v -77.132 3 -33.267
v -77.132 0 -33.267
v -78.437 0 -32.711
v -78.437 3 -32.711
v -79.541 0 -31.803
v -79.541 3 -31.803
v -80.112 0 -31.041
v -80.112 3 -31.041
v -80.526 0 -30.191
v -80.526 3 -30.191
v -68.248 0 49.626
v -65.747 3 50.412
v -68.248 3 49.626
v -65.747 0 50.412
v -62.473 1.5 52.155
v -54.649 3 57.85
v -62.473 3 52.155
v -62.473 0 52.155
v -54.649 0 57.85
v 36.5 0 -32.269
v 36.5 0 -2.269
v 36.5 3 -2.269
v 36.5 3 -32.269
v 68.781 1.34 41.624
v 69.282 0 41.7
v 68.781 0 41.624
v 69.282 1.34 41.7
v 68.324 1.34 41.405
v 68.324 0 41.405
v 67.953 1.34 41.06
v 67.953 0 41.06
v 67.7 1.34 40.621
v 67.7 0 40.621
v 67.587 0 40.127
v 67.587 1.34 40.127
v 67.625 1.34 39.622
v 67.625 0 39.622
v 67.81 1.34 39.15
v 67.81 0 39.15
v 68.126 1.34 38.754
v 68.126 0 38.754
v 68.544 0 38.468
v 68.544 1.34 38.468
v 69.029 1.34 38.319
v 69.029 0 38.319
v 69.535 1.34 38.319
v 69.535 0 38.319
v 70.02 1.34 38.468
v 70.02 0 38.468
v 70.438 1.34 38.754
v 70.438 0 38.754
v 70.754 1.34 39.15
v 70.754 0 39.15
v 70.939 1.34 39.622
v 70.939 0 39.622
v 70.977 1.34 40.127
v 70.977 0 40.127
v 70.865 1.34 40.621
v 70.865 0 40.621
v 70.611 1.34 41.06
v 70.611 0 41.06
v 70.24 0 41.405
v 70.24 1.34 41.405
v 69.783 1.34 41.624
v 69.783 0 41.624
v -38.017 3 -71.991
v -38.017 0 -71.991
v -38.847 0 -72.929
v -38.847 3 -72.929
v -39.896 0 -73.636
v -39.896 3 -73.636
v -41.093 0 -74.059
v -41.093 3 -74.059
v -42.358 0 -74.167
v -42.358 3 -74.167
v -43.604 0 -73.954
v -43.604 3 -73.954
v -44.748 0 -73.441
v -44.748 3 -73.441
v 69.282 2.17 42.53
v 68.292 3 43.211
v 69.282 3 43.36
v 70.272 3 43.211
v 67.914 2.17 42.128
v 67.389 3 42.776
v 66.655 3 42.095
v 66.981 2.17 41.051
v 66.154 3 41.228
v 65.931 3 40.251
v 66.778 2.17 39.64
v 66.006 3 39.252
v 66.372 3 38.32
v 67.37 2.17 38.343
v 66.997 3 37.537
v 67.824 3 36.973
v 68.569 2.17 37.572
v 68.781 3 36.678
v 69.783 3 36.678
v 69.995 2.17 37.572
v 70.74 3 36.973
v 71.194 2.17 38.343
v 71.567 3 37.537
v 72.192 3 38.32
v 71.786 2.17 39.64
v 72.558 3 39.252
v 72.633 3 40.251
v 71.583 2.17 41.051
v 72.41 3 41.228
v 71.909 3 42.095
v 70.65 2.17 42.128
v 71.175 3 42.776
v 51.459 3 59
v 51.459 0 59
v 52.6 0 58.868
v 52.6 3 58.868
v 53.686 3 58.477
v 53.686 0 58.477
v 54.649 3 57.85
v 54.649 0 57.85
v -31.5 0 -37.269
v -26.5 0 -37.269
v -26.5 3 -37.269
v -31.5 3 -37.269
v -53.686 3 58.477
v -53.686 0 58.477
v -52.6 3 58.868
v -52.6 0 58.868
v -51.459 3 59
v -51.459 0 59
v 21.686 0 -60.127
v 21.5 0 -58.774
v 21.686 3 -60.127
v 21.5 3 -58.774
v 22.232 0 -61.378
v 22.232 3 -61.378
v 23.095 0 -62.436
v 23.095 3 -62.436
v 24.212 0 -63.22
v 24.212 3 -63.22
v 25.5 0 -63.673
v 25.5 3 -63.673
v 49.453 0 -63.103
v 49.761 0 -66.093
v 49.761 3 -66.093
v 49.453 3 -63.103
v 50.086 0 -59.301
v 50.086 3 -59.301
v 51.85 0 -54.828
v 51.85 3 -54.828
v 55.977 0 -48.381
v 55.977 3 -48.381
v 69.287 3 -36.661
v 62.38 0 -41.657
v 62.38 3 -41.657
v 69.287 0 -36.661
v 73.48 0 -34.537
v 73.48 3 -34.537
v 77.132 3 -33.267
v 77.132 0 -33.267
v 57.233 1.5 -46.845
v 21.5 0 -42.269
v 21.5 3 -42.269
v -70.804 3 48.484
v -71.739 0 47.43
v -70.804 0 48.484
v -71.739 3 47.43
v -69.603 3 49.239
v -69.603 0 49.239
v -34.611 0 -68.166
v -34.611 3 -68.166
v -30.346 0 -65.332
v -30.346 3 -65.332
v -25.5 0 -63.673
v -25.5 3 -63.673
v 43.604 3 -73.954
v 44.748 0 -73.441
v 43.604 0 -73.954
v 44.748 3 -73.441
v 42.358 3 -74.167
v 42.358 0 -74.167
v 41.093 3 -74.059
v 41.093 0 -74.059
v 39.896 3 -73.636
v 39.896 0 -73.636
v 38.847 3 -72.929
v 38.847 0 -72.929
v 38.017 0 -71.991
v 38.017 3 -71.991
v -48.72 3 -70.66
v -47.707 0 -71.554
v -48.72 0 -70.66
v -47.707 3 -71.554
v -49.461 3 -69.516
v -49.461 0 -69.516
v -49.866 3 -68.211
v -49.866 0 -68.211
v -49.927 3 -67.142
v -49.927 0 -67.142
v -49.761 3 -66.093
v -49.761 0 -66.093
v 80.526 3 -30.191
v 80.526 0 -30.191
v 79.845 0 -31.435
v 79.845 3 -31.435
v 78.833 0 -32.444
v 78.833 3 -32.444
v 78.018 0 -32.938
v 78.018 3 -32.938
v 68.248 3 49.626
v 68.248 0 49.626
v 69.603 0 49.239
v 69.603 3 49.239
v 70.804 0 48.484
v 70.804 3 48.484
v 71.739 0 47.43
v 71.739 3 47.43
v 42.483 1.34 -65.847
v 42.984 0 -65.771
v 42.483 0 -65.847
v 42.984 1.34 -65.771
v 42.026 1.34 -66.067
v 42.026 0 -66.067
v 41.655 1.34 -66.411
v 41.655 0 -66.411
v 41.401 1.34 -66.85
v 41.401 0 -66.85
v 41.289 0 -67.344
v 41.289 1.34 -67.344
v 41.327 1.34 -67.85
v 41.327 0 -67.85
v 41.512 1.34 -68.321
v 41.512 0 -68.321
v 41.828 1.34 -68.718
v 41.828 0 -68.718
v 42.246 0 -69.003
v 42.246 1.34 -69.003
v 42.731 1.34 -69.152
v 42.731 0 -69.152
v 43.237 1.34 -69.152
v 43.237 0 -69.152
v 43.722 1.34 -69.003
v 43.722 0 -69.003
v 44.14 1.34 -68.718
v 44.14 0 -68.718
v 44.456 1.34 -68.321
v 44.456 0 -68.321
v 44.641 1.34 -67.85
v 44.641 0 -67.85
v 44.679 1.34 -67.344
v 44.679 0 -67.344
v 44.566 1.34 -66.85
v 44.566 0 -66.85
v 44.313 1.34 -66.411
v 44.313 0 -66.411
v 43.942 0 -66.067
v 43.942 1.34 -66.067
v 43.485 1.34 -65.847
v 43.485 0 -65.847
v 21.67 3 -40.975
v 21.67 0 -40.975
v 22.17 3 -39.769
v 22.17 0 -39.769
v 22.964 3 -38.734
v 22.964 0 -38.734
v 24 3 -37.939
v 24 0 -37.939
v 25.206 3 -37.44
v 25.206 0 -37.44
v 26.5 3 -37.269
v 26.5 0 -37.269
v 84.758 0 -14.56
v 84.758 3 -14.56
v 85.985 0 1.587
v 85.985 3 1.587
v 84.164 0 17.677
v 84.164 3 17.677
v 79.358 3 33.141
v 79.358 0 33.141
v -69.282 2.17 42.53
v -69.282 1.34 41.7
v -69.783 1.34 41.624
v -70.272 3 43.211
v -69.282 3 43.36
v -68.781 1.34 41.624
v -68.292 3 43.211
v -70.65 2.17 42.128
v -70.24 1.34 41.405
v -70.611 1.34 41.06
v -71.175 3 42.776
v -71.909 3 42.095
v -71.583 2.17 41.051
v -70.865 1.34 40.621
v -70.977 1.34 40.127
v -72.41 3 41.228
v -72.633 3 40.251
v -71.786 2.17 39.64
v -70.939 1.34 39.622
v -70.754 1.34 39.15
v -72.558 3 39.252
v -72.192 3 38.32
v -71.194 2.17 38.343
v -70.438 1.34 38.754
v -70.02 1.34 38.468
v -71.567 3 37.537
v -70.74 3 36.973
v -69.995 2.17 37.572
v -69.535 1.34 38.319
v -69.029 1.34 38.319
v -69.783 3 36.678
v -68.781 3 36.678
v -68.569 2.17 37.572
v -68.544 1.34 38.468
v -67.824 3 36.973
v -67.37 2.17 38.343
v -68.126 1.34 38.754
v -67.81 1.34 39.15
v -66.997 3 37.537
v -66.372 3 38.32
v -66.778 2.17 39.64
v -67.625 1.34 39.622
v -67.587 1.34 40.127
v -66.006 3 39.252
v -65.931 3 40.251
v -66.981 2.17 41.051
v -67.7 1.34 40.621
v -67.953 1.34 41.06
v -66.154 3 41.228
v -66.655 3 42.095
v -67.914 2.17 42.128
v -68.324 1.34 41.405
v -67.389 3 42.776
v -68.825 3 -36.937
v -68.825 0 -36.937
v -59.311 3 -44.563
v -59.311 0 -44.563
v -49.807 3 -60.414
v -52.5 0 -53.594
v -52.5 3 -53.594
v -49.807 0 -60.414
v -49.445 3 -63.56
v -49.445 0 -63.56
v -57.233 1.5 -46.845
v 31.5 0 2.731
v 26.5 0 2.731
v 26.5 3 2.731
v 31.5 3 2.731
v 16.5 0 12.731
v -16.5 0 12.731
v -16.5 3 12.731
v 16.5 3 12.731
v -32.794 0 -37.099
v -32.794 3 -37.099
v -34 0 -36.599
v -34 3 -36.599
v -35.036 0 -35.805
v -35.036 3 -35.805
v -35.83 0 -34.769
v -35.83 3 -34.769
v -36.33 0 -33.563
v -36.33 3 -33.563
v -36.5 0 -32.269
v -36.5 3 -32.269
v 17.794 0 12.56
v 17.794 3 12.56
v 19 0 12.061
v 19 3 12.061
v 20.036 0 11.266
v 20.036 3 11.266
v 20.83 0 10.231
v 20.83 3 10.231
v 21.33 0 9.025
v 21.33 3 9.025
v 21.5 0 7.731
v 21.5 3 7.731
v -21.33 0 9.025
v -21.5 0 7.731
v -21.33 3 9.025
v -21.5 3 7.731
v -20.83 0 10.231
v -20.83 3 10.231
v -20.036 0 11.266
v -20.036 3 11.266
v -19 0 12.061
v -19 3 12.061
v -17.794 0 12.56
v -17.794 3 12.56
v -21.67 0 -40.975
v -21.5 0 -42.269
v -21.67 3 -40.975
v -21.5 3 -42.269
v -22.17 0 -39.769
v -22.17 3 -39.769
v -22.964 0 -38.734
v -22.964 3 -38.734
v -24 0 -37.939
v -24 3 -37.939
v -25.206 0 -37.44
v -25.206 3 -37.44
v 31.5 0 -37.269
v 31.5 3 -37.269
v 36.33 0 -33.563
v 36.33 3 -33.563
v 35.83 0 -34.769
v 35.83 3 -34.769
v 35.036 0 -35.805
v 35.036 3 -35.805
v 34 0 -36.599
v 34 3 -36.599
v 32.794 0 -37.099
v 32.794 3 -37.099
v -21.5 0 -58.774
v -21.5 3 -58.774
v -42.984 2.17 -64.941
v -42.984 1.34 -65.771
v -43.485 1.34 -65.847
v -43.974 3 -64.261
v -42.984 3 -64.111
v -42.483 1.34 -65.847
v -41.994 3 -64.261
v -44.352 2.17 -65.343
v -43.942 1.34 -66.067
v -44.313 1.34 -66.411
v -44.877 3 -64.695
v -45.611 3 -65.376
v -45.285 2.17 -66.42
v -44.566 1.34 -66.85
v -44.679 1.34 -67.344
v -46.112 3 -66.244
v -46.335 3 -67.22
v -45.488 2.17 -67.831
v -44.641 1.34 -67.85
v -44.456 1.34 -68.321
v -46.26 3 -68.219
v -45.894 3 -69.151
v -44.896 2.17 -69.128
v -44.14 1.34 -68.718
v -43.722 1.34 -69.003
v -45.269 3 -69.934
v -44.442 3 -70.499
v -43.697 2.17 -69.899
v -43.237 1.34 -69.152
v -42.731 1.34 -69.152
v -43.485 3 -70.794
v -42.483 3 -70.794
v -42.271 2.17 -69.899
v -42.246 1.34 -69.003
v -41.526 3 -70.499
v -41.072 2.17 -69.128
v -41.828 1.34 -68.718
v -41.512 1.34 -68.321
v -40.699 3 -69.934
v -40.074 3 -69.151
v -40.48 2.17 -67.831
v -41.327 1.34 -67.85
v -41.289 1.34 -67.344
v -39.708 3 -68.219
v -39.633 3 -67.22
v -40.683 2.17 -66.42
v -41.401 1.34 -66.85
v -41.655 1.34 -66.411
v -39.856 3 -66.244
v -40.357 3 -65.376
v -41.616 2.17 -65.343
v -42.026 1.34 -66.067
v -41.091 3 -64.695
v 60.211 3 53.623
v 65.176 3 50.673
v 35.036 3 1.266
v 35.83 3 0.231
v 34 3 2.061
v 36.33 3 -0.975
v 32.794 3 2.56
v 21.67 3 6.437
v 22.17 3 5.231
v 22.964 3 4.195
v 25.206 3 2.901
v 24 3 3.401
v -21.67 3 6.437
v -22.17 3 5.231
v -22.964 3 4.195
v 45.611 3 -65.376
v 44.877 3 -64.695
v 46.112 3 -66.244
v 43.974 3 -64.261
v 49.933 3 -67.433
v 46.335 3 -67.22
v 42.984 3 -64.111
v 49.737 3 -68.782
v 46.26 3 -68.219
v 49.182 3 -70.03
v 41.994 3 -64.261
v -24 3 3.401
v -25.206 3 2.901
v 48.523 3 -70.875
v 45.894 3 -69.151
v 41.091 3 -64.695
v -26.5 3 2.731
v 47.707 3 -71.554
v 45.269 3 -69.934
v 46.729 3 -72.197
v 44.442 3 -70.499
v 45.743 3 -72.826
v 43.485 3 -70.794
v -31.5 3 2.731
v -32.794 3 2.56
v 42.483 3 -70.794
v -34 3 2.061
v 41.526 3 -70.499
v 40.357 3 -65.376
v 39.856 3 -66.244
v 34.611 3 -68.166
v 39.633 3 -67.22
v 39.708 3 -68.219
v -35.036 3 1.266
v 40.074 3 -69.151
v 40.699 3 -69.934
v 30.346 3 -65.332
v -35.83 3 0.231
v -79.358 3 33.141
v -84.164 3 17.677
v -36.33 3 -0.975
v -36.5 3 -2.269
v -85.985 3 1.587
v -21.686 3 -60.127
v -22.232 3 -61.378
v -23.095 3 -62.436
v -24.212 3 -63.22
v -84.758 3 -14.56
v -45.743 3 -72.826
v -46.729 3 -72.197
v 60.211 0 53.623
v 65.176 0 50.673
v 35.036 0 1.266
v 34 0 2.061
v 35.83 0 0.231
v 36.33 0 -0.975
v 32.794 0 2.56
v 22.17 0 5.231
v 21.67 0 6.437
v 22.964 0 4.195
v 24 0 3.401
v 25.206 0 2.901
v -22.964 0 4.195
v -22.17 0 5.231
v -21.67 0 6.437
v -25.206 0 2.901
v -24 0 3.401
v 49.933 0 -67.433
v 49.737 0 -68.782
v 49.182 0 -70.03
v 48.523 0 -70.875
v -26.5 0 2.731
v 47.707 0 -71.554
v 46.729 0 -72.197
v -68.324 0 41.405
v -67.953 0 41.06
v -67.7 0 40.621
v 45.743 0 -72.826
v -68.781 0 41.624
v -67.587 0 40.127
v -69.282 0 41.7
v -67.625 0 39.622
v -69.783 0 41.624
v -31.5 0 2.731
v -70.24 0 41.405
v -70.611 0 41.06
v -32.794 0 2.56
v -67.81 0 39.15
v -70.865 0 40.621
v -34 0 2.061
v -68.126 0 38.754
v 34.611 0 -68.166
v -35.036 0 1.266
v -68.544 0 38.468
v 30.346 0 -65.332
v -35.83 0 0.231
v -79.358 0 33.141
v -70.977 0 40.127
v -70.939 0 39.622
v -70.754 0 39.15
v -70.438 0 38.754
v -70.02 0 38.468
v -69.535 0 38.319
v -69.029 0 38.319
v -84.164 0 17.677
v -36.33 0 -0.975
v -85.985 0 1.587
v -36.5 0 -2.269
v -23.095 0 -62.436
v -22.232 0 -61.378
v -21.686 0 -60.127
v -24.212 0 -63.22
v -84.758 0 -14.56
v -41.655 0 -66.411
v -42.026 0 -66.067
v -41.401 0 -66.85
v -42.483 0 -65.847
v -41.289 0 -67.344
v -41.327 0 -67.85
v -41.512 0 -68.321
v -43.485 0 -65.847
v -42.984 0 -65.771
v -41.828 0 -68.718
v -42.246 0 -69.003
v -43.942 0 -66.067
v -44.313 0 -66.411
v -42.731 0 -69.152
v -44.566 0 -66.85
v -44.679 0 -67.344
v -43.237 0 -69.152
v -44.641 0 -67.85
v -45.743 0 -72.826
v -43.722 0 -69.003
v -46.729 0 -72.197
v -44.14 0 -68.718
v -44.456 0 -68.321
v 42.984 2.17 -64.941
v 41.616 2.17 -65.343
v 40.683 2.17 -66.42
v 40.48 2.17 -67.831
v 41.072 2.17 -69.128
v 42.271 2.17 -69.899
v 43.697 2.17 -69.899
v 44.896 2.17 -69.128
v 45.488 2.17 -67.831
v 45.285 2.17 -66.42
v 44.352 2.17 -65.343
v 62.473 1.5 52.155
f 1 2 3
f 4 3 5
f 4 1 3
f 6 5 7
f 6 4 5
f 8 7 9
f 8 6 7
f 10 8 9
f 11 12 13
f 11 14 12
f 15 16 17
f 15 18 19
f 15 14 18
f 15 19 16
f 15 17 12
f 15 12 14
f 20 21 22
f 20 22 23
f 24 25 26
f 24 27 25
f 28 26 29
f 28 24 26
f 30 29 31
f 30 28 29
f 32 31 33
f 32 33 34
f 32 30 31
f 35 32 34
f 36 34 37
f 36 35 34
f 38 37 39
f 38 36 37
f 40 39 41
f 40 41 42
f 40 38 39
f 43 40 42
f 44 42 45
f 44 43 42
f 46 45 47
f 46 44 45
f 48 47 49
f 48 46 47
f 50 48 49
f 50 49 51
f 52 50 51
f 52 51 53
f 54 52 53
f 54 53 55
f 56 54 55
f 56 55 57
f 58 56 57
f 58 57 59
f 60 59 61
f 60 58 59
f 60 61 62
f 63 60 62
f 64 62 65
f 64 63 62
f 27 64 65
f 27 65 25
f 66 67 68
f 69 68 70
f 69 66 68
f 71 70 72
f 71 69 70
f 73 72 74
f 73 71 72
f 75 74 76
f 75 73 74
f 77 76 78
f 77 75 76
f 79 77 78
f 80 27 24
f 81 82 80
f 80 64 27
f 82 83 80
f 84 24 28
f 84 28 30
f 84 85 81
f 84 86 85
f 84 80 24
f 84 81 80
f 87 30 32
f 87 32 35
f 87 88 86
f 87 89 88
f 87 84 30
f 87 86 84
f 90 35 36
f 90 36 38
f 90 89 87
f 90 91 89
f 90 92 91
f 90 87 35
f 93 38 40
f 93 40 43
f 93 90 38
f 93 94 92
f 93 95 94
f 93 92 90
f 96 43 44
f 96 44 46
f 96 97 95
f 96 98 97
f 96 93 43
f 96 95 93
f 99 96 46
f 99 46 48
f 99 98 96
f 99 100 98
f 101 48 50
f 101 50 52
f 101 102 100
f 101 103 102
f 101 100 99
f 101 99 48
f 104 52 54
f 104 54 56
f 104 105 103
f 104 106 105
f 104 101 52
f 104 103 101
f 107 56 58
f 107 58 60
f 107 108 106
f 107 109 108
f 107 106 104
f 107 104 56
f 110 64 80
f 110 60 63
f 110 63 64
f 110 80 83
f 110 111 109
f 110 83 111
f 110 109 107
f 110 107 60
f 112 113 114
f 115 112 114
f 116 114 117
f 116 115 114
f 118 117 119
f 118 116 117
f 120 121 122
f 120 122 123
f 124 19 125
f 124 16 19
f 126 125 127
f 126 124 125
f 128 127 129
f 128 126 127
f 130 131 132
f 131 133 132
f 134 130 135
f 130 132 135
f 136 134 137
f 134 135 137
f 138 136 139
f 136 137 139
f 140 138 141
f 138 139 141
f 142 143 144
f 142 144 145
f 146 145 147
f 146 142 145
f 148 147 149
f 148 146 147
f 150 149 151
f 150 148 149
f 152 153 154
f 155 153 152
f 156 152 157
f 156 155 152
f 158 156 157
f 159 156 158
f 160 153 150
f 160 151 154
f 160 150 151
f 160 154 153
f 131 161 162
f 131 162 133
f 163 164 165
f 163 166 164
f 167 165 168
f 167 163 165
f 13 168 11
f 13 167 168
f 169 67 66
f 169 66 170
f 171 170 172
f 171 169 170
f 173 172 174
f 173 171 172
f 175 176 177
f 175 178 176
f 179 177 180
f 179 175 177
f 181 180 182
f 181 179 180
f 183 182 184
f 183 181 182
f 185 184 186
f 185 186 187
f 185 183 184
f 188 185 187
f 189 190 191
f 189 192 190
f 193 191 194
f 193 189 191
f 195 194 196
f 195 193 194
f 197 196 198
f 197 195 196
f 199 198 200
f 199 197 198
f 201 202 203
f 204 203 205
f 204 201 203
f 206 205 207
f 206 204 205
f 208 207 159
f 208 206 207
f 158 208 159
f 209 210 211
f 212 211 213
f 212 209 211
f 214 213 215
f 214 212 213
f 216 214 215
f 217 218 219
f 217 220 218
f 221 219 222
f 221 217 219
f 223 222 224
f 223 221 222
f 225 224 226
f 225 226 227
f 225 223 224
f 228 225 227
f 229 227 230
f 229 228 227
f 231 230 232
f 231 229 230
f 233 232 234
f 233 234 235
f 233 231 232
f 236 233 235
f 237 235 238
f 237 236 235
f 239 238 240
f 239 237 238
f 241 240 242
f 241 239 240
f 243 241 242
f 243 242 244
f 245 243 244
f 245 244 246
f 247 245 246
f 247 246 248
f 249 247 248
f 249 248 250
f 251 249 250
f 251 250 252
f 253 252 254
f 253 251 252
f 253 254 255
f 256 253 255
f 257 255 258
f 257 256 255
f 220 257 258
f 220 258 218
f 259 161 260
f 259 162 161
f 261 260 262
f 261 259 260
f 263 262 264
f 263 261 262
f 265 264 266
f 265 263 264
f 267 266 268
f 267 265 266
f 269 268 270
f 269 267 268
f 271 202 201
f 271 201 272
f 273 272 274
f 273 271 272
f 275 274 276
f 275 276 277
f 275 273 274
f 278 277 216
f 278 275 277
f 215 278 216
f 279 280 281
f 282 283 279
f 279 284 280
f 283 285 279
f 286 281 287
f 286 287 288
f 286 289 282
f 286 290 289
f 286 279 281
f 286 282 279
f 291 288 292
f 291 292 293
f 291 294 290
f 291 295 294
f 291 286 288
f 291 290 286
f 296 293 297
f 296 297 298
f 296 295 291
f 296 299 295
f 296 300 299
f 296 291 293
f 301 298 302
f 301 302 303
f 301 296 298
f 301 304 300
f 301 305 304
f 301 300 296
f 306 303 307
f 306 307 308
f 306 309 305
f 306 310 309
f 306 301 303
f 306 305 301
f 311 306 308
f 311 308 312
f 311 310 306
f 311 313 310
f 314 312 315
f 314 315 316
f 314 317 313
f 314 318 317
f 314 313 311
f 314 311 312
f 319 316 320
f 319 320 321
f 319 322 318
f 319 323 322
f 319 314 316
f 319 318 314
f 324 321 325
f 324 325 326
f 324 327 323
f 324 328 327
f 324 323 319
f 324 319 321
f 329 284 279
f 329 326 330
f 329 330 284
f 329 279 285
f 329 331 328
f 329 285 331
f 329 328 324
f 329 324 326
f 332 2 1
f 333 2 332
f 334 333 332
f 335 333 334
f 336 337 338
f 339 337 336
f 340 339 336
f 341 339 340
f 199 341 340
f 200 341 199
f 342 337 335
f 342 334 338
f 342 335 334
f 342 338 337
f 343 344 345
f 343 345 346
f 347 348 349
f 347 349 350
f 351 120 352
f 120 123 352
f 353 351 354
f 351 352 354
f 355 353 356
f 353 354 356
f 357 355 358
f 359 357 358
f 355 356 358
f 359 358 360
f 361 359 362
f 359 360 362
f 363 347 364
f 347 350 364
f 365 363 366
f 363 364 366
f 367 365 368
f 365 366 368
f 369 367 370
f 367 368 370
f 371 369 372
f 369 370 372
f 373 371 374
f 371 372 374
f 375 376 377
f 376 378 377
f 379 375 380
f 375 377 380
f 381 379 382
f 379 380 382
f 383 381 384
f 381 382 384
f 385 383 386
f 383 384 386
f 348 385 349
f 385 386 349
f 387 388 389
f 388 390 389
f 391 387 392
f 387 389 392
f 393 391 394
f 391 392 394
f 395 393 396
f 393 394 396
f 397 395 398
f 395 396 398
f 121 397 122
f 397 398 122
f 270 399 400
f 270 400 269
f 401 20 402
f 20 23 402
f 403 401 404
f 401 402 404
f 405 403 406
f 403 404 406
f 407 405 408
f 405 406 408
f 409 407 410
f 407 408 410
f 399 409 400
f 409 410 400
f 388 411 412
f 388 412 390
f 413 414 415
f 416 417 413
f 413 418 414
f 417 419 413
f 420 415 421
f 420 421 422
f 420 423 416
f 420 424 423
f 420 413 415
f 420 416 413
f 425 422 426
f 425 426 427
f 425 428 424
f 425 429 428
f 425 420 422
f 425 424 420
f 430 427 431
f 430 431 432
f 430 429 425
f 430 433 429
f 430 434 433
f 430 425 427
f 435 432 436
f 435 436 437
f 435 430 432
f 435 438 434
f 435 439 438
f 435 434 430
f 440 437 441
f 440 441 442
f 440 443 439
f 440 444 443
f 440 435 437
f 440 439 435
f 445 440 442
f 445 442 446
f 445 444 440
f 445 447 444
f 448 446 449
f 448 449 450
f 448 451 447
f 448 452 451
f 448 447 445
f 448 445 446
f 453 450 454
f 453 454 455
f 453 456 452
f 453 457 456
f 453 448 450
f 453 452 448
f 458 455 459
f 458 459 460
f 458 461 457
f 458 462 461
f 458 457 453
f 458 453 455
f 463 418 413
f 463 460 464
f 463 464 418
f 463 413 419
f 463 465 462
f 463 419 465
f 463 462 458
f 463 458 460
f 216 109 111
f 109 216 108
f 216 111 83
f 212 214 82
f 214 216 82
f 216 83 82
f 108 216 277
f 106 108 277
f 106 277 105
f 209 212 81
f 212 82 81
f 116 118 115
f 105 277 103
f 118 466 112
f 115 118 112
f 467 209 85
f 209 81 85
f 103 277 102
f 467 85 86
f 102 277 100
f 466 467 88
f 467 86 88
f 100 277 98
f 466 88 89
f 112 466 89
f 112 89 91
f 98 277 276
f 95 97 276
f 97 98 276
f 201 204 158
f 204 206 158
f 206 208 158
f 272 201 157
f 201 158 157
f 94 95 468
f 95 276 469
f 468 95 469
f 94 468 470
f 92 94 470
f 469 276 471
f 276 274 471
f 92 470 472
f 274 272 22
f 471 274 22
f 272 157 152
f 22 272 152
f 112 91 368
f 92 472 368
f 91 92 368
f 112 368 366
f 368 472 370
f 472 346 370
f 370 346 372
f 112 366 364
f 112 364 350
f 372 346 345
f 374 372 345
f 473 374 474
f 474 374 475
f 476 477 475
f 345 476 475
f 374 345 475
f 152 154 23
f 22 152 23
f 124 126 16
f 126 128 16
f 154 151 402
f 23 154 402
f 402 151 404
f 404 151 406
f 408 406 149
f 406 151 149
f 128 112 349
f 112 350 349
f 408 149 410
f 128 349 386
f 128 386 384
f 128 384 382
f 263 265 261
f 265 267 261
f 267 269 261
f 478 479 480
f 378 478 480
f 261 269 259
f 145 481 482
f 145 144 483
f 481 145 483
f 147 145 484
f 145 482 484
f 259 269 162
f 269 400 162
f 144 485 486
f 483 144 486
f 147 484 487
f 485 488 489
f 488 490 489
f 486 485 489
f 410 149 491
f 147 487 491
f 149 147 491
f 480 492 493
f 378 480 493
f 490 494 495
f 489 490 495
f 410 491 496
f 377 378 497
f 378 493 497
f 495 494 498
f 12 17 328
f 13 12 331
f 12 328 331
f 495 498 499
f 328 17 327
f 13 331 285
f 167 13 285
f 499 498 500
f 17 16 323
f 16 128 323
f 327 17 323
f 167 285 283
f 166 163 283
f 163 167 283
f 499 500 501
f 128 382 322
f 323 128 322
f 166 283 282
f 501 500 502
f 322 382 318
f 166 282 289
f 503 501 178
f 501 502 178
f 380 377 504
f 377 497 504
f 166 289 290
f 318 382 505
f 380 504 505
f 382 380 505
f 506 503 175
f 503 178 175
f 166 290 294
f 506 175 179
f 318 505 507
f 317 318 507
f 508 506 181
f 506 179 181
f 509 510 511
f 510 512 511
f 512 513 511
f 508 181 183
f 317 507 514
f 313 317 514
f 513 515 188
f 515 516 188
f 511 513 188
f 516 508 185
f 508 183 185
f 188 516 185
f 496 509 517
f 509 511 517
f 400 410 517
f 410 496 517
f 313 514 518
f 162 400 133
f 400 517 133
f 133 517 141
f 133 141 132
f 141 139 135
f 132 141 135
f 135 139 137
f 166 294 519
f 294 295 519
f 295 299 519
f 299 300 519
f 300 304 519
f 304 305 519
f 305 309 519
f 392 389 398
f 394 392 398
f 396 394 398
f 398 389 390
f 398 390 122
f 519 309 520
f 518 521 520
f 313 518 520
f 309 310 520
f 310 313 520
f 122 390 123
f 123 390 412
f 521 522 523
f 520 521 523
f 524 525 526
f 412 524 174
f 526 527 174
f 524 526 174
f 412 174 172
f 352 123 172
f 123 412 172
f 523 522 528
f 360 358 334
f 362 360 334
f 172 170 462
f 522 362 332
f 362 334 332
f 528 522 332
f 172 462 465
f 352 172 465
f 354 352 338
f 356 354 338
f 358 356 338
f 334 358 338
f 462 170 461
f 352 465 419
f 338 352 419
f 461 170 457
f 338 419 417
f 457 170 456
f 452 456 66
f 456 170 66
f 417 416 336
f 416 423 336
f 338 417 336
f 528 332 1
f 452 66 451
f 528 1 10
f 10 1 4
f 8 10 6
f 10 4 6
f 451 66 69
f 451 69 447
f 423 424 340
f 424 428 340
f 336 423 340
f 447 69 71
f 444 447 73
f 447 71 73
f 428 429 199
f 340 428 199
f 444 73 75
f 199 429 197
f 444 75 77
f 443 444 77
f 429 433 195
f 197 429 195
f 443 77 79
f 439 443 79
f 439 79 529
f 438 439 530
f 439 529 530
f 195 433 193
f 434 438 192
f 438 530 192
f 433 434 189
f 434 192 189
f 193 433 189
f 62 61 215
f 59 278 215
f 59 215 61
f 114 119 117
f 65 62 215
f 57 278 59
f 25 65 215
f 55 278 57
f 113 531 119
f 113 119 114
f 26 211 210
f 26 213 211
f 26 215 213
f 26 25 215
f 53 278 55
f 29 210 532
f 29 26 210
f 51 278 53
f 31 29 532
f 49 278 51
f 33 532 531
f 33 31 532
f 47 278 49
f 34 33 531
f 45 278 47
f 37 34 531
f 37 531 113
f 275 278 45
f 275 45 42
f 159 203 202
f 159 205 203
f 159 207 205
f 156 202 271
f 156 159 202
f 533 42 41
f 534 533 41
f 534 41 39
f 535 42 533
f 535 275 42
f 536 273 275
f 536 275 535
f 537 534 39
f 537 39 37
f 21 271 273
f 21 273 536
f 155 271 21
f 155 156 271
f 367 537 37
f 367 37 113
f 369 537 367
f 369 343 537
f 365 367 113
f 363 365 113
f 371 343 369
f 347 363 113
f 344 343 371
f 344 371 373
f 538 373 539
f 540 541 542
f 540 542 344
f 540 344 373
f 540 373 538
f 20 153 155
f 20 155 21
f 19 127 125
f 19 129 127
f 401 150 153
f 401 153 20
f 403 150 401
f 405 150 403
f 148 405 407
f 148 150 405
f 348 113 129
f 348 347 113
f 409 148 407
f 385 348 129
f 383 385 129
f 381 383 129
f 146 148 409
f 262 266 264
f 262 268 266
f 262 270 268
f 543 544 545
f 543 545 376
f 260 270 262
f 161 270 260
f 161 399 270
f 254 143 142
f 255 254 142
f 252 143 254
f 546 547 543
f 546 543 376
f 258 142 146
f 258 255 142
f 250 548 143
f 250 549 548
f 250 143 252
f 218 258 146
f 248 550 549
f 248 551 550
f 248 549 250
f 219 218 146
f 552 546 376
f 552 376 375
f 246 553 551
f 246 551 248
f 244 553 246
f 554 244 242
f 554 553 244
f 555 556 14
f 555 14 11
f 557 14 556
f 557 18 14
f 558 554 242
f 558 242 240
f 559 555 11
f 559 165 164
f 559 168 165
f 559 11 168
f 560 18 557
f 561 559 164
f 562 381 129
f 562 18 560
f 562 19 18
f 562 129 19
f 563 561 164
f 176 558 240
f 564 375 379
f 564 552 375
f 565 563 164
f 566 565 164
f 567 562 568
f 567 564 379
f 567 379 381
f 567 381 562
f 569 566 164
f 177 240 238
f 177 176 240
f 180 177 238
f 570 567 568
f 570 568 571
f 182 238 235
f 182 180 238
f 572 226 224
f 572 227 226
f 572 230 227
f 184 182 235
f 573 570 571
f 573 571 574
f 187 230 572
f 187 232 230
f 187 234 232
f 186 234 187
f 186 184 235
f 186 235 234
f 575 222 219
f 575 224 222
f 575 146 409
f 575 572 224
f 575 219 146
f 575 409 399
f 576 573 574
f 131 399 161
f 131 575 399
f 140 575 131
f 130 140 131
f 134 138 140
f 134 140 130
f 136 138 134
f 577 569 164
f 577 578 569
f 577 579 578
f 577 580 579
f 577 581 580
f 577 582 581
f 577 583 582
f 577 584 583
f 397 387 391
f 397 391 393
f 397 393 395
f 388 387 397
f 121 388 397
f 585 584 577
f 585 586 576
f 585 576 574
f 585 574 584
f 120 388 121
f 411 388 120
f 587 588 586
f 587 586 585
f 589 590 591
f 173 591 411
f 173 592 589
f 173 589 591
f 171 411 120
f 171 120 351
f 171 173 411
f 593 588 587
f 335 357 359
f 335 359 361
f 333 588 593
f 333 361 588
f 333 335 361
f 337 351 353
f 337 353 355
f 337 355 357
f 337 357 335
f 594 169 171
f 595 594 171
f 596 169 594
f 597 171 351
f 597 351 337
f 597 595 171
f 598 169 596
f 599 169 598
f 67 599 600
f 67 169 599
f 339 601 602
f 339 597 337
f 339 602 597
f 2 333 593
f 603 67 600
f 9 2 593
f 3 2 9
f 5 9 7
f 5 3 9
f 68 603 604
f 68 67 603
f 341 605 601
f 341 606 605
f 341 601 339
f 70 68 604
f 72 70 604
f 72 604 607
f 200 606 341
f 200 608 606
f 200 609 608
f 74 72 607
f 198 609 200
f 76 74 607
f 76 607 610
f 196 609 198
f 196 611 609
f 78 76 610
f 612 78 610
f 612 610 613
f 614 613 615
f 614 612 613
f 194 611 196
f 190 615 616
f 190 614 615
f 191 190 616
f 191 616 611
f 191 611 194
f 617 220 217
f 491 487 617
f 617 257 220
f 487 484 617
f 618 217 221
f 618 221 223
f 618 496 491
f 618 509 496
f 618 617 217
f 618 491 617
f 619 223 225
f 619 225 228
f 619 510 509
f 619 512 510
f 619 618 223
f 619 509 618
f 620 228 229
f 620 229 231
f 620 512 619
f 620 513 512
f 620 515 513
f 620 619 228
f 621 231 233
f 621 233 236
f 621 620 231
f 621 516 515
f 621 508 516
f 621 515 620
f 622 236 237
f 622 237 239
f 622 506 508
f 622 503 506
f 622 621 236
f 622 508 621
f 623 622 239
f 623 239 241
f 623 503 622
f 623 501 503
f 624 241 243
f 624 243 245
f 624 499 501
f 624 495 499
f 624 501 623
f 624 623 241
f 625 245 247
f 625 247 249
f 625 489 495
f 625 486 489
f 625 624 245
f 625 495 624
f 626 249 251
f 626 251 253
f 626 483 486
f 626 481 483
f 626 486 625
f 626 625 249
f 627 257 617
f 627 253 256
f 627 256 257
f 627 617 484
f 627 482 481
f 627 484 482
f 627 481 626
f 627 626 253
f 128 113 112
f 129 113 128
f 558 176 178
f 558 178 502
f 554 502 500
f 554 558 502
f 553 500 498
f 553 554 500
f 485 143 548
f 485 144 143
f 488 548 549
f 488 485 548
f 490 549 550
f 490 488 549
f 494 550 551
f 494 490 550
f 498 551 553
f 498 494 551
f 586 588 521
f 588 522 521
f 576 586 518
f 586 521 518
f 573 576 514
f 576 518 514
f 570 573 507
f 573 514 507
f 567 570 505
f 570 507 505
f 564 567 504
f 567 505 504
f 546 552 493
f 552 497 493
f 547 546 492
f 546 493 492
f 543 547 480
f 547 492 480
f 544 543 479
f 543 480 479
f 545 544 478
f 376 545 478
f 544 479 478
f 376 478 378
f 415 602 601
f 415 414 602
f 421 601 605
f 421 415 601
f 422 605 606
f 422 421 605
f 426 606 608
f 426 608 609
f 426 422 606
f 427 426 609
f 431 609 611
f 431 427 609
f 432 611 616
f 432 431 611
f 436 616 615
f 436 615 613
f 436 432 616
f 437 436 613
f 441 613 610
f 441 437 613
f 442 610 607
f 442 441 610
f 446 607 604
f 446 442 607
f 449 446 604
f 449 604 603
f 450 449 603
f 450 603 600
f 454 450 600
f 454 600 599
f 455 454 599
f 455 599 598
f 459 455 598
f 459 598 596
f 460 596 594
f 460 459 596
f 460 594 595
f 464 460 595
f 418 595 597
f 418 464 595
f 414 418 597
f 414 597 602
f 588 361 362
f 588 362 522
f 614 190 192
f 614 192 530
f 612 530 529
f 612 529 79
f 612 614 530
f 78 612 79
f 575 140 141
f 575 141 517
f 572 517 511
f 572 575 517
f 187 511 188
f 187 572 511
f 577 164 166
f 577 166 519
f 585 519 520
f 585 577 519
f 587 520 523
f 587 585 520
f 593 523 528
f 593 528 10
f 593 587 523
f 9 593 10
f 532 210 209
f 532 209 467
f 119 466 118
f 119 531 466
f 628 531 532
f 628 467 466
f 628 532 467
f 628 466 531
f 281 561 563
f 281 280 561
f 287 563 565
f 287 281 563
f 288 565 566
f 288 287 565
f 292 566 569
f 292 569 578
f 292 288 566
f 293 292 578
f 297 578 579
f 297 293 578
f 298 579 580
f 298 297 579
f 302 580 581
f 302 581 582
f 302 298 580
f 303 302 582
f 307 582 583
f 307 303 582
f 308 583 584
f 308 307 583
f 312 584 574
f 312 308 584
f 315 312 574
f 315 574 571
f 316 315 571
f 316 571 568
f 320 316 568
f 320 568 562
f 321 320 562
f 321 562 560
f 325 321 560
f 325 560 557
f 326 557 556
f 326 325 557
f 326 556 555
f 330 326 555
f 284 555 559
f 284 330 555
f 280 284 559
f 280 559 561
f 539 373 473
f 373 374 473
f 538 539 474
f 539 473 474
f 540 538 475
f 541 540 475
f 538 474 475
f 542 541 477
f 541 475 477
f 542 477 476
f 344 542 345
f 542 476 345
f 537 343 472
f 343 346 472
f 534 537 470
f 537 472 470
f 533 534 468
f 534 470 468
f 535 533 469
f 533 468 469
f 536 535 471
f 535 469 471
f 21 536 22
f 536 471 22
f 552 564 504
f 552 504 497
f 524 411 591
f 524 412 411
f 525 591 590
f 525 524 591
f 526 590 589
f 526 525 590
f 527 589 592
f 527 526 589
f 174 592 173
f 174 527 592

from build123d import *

# Parameters (mm, degrees)
RESSALTO_EXTRUS_O2_DEPTH            = 3
ESCAREADO_PARA_SFHCS_M31_AT_2_COUNT = 2
ESCAREADO_PARA_SFHCS_M31_AT_2_PITCH = 110.642088925
ESCAREADO_PARA_SFHCS_M31_AT_3_COUNT = 2
ESCAREADO_PARA_SFHCS_M31_AT_3_PITCH = 155.41473117
ESCAREADO_PARA_SFHCS_M31_AT_4_COUNT = 2
ESCAREADO_PARA_SFHCS_M31_AT_4_PITCH = 85.967937335
FILETE4_R                           = 5
FILETE6_R                           = 5
FILETE7_R                           = 5
FILETE8_R                           = 5


with BuildPart() as part:
    # Esboço3 → Ressalto-extrusão2 (new body)
    with BuildSketch(Plane(origin=(0, 0, 0), x_dir=(1, 0, 0), z_dir=(0, 1, 0))):
        with BuildLine():
            Line((-21.5, 63.269141943), (-21.5, 37.269141943))
            Line((-21.5, 37.269141943), (-36.5, 37.269141943))
            Line((-36.5, 37.269141943), (-36.5, -2.730858057))
            Line((-36.5, -2.730858057), (-21.5, -2.730858057))
            Line((-21.5, -2.730858057), (-21.5, -12.730858057))
            Line((-21.5, -12.730858057), (21.5, -12.730858057))
            Line((21.5, -12.730858057), (21.5, -2.730858057))
            Line((21.5, -2.730858057), (36.5, -2.730858057))
            Line((36.5, -2.730858057), (36.5, 37.269141943))
            Line((36.5, 37.269141943), (21.5, 37.269141943))
            Line((21.5, 37.269141943), (21.5, 63.269141943))
            ThreePointArc((21.5, 63.269141943), (32.805831499, 66.771318629), (40.152161049, 76.051324532))
            ThreePointArc((40.152161049, 76.051324532), (45.878189612, 72.740578208), (51.332841832, 68.999560502))
            add(Edge.make_bspline(
                [(51.332841832, 68.999560502), (24.845967814, 40.579122115), (79.509348747, 32.775958595)],
                knots=[0, 0, 0, 2.519003886, 2.519003886, 2.519003886], degree=2, weights=[1, 0.306291066, 1]))
            ThreePointArc((79.509348747, 32.775958595), (85.434712449, -9.844283047), (69.971422738, -50))
            add(Edge.make_bspline(
                [(69.971422738, -50), (67.189039214, -47.047402145), (53.286638173, -59)],
                knots=[3.141592654, 3.141592654, 3.141592654, 4.504907102, 4.504907102, 4.504907102], degree=2, weights=[1, 0.776529601, 1]))
            Line((53.286638173, -59), (-53.286638173, -59))
            add(Edge.make_bspline(
                [(-53.286638173, -59), (-67.189039214, -47.047402145), (-69.971422738, -50)],
                knots=[1.778278205, 1.778278205, 1.778278205, 3.141592654, 3.141592654, 3.141592654], degree=2, weights=[1, 0.776529601, 1]))
            ThreePointArc((-69.971422738, -50), (-85.434712449, -9.844283047), (-79.509348747, 32.775958595))
            add(Edge.make_bspline(
                [(-79.509348747, 32.775958595), (-24.845967814, 40.579122115), (-51.332841832, 68.999560502)],
                knots=[0.622588768, 0.622588768, 0.622588768, 3.141592654, 3.141592654, 3.141592654], degree=2, weights=[1, 0.306291066, 1]))
            ThreePointArc((-51.332841832, 68.999560502), (-45.878189612, 72.740578208), (-40.152161049, 76.051324532))
            ThreePointArc((-40.152161049, 76.051324532), (-32.805831499, 66.771318629), (-21.5, 63.269141943))
        make_face()
    extrude(amount=RESSALTO_EXTRUS_O2_DEPTH)

    # Esboço12 → Escareado para SFHCS M31 (revolve, cut)
    with BuildSketch(Plane(origin=(42.983968668, 3, -67.471315665), x_dir=(0, 0, 1), z_dir=(1, 0, 0))):
        Polygon((0, 0), (0, 3), (1.7, 3), (1.7, 1.66), (3.36, 0), align=None)
    escareado_para_sfhcs_m31 = revolve(axis=Axis((42.983968668, 9.35, -67.471315665), (0, -1, 0)), mode=Mode.SUBTRACT)

    # Escareado para SFHCS M31 at 2: Escareado para SFHCS M31 ×2
    with Locations(*[Vector(0.23768589232617374, 0, 0.9713420698132613) * (i * ESCAREADO_PARA_SFHCS_M31_AT_2_PITCH) for i in range(1, ESCAREADO_PARA_SFHCS_M31_AT_2_COUNT)]):
        add(escareado_para_sfhcs_m31, mode=Mode.SUBTRACT)

    # Escareado para SFHCS M31 at 3: Escareado para SFHCS M31 ×2
    with Locations(*[Vector(-0.7223639620597521, 0, 0.6915130557822732) * (i * ESCAREADO_PARA_SFHCS_M31_AT_3_PITCH) for i in range(1, ESCAREADO_PARA_SFHCS_M31_AT_3_COUNT)]):
        add(escareado_para_sfhcs_m31, mode=Mode.SUBTRACT)

    # Escareado para SFHCS M31 at 4: Escareado para SFHCS M31 ×2
    with Locations(*[(-i * ESCAREADO_PARA_SFHCS_M31_AT_4_PITCH, 0, 0) for i in range(1, ESCAREADO_PARA_SFHCS_M31_AT_4_COUNT)]):
        add(escareado_para_sfhcs_m31, mode=Mode.SUBTRACT)

    # Filete4
    filete4_edges = [part.edges().sort_by_distance(p)[0] for p in [
        (21.5, 1.5, -63.269141943),
        (40.152161049, 1.5, -76.051324532),
        (-40.152161049, 1.5, -76.051324532),
        (-21.5, 1.5, -63.269141943),
    ]]
    fillet(filete4_edges, radius=FILETE4_R)

    # Filete6
    filete6_edges = [part.edges().sort_by_distance(p)[0] for p in [
        (69.971422738, 1.5, 50),
        (53.286638173, 1.5, 59),
        (-53.286638173, 1.5, 59),
        (-69.971422738, 1.5, 50),
    ]]
    fillet(filete6_edges, radius=FILETE6_R)

    # Filete7
    filete7_edges = [part.edges().sort_by_distance(p)[0] for p in [
        (-21.5, 1.5, 12.730858057),
        (21.5, 1.5, 12.730858057),
        (21.5, 1.5, 2.730858057),
        (36.5, 1.5, 2.730858057),
        (36.5, 1.5, -37.269141943),
        (21.5, 1.5, -37.269141943),
        (-21.5, 1.5, -37.269141943),
        (-36.5, 1.5, -37.269141943),
        (-36.5, 1.5, 2.730858057),
        (-21.5, 1.5, 2.730858057),
    ]]
    fillet(filete7_edges, radius=FILETE7_R - 0.0001)  # a hair under: the kernel refuses the full size

    # Filete8
    filete8_edges = [part.edges().sort_by_distance(p)[0] for p in [
        (79.509348747, 1.5, -32.775958595),
        (51.332841832, 1.5, -68.999560502),
        (-79.509348747, 1.5, -32.775958595),
        (-51.332841832, 1.5, -68.999560502),
    ]]
    fillet(filete8_edges, radius=FILETE8_R)


solid = part.part
